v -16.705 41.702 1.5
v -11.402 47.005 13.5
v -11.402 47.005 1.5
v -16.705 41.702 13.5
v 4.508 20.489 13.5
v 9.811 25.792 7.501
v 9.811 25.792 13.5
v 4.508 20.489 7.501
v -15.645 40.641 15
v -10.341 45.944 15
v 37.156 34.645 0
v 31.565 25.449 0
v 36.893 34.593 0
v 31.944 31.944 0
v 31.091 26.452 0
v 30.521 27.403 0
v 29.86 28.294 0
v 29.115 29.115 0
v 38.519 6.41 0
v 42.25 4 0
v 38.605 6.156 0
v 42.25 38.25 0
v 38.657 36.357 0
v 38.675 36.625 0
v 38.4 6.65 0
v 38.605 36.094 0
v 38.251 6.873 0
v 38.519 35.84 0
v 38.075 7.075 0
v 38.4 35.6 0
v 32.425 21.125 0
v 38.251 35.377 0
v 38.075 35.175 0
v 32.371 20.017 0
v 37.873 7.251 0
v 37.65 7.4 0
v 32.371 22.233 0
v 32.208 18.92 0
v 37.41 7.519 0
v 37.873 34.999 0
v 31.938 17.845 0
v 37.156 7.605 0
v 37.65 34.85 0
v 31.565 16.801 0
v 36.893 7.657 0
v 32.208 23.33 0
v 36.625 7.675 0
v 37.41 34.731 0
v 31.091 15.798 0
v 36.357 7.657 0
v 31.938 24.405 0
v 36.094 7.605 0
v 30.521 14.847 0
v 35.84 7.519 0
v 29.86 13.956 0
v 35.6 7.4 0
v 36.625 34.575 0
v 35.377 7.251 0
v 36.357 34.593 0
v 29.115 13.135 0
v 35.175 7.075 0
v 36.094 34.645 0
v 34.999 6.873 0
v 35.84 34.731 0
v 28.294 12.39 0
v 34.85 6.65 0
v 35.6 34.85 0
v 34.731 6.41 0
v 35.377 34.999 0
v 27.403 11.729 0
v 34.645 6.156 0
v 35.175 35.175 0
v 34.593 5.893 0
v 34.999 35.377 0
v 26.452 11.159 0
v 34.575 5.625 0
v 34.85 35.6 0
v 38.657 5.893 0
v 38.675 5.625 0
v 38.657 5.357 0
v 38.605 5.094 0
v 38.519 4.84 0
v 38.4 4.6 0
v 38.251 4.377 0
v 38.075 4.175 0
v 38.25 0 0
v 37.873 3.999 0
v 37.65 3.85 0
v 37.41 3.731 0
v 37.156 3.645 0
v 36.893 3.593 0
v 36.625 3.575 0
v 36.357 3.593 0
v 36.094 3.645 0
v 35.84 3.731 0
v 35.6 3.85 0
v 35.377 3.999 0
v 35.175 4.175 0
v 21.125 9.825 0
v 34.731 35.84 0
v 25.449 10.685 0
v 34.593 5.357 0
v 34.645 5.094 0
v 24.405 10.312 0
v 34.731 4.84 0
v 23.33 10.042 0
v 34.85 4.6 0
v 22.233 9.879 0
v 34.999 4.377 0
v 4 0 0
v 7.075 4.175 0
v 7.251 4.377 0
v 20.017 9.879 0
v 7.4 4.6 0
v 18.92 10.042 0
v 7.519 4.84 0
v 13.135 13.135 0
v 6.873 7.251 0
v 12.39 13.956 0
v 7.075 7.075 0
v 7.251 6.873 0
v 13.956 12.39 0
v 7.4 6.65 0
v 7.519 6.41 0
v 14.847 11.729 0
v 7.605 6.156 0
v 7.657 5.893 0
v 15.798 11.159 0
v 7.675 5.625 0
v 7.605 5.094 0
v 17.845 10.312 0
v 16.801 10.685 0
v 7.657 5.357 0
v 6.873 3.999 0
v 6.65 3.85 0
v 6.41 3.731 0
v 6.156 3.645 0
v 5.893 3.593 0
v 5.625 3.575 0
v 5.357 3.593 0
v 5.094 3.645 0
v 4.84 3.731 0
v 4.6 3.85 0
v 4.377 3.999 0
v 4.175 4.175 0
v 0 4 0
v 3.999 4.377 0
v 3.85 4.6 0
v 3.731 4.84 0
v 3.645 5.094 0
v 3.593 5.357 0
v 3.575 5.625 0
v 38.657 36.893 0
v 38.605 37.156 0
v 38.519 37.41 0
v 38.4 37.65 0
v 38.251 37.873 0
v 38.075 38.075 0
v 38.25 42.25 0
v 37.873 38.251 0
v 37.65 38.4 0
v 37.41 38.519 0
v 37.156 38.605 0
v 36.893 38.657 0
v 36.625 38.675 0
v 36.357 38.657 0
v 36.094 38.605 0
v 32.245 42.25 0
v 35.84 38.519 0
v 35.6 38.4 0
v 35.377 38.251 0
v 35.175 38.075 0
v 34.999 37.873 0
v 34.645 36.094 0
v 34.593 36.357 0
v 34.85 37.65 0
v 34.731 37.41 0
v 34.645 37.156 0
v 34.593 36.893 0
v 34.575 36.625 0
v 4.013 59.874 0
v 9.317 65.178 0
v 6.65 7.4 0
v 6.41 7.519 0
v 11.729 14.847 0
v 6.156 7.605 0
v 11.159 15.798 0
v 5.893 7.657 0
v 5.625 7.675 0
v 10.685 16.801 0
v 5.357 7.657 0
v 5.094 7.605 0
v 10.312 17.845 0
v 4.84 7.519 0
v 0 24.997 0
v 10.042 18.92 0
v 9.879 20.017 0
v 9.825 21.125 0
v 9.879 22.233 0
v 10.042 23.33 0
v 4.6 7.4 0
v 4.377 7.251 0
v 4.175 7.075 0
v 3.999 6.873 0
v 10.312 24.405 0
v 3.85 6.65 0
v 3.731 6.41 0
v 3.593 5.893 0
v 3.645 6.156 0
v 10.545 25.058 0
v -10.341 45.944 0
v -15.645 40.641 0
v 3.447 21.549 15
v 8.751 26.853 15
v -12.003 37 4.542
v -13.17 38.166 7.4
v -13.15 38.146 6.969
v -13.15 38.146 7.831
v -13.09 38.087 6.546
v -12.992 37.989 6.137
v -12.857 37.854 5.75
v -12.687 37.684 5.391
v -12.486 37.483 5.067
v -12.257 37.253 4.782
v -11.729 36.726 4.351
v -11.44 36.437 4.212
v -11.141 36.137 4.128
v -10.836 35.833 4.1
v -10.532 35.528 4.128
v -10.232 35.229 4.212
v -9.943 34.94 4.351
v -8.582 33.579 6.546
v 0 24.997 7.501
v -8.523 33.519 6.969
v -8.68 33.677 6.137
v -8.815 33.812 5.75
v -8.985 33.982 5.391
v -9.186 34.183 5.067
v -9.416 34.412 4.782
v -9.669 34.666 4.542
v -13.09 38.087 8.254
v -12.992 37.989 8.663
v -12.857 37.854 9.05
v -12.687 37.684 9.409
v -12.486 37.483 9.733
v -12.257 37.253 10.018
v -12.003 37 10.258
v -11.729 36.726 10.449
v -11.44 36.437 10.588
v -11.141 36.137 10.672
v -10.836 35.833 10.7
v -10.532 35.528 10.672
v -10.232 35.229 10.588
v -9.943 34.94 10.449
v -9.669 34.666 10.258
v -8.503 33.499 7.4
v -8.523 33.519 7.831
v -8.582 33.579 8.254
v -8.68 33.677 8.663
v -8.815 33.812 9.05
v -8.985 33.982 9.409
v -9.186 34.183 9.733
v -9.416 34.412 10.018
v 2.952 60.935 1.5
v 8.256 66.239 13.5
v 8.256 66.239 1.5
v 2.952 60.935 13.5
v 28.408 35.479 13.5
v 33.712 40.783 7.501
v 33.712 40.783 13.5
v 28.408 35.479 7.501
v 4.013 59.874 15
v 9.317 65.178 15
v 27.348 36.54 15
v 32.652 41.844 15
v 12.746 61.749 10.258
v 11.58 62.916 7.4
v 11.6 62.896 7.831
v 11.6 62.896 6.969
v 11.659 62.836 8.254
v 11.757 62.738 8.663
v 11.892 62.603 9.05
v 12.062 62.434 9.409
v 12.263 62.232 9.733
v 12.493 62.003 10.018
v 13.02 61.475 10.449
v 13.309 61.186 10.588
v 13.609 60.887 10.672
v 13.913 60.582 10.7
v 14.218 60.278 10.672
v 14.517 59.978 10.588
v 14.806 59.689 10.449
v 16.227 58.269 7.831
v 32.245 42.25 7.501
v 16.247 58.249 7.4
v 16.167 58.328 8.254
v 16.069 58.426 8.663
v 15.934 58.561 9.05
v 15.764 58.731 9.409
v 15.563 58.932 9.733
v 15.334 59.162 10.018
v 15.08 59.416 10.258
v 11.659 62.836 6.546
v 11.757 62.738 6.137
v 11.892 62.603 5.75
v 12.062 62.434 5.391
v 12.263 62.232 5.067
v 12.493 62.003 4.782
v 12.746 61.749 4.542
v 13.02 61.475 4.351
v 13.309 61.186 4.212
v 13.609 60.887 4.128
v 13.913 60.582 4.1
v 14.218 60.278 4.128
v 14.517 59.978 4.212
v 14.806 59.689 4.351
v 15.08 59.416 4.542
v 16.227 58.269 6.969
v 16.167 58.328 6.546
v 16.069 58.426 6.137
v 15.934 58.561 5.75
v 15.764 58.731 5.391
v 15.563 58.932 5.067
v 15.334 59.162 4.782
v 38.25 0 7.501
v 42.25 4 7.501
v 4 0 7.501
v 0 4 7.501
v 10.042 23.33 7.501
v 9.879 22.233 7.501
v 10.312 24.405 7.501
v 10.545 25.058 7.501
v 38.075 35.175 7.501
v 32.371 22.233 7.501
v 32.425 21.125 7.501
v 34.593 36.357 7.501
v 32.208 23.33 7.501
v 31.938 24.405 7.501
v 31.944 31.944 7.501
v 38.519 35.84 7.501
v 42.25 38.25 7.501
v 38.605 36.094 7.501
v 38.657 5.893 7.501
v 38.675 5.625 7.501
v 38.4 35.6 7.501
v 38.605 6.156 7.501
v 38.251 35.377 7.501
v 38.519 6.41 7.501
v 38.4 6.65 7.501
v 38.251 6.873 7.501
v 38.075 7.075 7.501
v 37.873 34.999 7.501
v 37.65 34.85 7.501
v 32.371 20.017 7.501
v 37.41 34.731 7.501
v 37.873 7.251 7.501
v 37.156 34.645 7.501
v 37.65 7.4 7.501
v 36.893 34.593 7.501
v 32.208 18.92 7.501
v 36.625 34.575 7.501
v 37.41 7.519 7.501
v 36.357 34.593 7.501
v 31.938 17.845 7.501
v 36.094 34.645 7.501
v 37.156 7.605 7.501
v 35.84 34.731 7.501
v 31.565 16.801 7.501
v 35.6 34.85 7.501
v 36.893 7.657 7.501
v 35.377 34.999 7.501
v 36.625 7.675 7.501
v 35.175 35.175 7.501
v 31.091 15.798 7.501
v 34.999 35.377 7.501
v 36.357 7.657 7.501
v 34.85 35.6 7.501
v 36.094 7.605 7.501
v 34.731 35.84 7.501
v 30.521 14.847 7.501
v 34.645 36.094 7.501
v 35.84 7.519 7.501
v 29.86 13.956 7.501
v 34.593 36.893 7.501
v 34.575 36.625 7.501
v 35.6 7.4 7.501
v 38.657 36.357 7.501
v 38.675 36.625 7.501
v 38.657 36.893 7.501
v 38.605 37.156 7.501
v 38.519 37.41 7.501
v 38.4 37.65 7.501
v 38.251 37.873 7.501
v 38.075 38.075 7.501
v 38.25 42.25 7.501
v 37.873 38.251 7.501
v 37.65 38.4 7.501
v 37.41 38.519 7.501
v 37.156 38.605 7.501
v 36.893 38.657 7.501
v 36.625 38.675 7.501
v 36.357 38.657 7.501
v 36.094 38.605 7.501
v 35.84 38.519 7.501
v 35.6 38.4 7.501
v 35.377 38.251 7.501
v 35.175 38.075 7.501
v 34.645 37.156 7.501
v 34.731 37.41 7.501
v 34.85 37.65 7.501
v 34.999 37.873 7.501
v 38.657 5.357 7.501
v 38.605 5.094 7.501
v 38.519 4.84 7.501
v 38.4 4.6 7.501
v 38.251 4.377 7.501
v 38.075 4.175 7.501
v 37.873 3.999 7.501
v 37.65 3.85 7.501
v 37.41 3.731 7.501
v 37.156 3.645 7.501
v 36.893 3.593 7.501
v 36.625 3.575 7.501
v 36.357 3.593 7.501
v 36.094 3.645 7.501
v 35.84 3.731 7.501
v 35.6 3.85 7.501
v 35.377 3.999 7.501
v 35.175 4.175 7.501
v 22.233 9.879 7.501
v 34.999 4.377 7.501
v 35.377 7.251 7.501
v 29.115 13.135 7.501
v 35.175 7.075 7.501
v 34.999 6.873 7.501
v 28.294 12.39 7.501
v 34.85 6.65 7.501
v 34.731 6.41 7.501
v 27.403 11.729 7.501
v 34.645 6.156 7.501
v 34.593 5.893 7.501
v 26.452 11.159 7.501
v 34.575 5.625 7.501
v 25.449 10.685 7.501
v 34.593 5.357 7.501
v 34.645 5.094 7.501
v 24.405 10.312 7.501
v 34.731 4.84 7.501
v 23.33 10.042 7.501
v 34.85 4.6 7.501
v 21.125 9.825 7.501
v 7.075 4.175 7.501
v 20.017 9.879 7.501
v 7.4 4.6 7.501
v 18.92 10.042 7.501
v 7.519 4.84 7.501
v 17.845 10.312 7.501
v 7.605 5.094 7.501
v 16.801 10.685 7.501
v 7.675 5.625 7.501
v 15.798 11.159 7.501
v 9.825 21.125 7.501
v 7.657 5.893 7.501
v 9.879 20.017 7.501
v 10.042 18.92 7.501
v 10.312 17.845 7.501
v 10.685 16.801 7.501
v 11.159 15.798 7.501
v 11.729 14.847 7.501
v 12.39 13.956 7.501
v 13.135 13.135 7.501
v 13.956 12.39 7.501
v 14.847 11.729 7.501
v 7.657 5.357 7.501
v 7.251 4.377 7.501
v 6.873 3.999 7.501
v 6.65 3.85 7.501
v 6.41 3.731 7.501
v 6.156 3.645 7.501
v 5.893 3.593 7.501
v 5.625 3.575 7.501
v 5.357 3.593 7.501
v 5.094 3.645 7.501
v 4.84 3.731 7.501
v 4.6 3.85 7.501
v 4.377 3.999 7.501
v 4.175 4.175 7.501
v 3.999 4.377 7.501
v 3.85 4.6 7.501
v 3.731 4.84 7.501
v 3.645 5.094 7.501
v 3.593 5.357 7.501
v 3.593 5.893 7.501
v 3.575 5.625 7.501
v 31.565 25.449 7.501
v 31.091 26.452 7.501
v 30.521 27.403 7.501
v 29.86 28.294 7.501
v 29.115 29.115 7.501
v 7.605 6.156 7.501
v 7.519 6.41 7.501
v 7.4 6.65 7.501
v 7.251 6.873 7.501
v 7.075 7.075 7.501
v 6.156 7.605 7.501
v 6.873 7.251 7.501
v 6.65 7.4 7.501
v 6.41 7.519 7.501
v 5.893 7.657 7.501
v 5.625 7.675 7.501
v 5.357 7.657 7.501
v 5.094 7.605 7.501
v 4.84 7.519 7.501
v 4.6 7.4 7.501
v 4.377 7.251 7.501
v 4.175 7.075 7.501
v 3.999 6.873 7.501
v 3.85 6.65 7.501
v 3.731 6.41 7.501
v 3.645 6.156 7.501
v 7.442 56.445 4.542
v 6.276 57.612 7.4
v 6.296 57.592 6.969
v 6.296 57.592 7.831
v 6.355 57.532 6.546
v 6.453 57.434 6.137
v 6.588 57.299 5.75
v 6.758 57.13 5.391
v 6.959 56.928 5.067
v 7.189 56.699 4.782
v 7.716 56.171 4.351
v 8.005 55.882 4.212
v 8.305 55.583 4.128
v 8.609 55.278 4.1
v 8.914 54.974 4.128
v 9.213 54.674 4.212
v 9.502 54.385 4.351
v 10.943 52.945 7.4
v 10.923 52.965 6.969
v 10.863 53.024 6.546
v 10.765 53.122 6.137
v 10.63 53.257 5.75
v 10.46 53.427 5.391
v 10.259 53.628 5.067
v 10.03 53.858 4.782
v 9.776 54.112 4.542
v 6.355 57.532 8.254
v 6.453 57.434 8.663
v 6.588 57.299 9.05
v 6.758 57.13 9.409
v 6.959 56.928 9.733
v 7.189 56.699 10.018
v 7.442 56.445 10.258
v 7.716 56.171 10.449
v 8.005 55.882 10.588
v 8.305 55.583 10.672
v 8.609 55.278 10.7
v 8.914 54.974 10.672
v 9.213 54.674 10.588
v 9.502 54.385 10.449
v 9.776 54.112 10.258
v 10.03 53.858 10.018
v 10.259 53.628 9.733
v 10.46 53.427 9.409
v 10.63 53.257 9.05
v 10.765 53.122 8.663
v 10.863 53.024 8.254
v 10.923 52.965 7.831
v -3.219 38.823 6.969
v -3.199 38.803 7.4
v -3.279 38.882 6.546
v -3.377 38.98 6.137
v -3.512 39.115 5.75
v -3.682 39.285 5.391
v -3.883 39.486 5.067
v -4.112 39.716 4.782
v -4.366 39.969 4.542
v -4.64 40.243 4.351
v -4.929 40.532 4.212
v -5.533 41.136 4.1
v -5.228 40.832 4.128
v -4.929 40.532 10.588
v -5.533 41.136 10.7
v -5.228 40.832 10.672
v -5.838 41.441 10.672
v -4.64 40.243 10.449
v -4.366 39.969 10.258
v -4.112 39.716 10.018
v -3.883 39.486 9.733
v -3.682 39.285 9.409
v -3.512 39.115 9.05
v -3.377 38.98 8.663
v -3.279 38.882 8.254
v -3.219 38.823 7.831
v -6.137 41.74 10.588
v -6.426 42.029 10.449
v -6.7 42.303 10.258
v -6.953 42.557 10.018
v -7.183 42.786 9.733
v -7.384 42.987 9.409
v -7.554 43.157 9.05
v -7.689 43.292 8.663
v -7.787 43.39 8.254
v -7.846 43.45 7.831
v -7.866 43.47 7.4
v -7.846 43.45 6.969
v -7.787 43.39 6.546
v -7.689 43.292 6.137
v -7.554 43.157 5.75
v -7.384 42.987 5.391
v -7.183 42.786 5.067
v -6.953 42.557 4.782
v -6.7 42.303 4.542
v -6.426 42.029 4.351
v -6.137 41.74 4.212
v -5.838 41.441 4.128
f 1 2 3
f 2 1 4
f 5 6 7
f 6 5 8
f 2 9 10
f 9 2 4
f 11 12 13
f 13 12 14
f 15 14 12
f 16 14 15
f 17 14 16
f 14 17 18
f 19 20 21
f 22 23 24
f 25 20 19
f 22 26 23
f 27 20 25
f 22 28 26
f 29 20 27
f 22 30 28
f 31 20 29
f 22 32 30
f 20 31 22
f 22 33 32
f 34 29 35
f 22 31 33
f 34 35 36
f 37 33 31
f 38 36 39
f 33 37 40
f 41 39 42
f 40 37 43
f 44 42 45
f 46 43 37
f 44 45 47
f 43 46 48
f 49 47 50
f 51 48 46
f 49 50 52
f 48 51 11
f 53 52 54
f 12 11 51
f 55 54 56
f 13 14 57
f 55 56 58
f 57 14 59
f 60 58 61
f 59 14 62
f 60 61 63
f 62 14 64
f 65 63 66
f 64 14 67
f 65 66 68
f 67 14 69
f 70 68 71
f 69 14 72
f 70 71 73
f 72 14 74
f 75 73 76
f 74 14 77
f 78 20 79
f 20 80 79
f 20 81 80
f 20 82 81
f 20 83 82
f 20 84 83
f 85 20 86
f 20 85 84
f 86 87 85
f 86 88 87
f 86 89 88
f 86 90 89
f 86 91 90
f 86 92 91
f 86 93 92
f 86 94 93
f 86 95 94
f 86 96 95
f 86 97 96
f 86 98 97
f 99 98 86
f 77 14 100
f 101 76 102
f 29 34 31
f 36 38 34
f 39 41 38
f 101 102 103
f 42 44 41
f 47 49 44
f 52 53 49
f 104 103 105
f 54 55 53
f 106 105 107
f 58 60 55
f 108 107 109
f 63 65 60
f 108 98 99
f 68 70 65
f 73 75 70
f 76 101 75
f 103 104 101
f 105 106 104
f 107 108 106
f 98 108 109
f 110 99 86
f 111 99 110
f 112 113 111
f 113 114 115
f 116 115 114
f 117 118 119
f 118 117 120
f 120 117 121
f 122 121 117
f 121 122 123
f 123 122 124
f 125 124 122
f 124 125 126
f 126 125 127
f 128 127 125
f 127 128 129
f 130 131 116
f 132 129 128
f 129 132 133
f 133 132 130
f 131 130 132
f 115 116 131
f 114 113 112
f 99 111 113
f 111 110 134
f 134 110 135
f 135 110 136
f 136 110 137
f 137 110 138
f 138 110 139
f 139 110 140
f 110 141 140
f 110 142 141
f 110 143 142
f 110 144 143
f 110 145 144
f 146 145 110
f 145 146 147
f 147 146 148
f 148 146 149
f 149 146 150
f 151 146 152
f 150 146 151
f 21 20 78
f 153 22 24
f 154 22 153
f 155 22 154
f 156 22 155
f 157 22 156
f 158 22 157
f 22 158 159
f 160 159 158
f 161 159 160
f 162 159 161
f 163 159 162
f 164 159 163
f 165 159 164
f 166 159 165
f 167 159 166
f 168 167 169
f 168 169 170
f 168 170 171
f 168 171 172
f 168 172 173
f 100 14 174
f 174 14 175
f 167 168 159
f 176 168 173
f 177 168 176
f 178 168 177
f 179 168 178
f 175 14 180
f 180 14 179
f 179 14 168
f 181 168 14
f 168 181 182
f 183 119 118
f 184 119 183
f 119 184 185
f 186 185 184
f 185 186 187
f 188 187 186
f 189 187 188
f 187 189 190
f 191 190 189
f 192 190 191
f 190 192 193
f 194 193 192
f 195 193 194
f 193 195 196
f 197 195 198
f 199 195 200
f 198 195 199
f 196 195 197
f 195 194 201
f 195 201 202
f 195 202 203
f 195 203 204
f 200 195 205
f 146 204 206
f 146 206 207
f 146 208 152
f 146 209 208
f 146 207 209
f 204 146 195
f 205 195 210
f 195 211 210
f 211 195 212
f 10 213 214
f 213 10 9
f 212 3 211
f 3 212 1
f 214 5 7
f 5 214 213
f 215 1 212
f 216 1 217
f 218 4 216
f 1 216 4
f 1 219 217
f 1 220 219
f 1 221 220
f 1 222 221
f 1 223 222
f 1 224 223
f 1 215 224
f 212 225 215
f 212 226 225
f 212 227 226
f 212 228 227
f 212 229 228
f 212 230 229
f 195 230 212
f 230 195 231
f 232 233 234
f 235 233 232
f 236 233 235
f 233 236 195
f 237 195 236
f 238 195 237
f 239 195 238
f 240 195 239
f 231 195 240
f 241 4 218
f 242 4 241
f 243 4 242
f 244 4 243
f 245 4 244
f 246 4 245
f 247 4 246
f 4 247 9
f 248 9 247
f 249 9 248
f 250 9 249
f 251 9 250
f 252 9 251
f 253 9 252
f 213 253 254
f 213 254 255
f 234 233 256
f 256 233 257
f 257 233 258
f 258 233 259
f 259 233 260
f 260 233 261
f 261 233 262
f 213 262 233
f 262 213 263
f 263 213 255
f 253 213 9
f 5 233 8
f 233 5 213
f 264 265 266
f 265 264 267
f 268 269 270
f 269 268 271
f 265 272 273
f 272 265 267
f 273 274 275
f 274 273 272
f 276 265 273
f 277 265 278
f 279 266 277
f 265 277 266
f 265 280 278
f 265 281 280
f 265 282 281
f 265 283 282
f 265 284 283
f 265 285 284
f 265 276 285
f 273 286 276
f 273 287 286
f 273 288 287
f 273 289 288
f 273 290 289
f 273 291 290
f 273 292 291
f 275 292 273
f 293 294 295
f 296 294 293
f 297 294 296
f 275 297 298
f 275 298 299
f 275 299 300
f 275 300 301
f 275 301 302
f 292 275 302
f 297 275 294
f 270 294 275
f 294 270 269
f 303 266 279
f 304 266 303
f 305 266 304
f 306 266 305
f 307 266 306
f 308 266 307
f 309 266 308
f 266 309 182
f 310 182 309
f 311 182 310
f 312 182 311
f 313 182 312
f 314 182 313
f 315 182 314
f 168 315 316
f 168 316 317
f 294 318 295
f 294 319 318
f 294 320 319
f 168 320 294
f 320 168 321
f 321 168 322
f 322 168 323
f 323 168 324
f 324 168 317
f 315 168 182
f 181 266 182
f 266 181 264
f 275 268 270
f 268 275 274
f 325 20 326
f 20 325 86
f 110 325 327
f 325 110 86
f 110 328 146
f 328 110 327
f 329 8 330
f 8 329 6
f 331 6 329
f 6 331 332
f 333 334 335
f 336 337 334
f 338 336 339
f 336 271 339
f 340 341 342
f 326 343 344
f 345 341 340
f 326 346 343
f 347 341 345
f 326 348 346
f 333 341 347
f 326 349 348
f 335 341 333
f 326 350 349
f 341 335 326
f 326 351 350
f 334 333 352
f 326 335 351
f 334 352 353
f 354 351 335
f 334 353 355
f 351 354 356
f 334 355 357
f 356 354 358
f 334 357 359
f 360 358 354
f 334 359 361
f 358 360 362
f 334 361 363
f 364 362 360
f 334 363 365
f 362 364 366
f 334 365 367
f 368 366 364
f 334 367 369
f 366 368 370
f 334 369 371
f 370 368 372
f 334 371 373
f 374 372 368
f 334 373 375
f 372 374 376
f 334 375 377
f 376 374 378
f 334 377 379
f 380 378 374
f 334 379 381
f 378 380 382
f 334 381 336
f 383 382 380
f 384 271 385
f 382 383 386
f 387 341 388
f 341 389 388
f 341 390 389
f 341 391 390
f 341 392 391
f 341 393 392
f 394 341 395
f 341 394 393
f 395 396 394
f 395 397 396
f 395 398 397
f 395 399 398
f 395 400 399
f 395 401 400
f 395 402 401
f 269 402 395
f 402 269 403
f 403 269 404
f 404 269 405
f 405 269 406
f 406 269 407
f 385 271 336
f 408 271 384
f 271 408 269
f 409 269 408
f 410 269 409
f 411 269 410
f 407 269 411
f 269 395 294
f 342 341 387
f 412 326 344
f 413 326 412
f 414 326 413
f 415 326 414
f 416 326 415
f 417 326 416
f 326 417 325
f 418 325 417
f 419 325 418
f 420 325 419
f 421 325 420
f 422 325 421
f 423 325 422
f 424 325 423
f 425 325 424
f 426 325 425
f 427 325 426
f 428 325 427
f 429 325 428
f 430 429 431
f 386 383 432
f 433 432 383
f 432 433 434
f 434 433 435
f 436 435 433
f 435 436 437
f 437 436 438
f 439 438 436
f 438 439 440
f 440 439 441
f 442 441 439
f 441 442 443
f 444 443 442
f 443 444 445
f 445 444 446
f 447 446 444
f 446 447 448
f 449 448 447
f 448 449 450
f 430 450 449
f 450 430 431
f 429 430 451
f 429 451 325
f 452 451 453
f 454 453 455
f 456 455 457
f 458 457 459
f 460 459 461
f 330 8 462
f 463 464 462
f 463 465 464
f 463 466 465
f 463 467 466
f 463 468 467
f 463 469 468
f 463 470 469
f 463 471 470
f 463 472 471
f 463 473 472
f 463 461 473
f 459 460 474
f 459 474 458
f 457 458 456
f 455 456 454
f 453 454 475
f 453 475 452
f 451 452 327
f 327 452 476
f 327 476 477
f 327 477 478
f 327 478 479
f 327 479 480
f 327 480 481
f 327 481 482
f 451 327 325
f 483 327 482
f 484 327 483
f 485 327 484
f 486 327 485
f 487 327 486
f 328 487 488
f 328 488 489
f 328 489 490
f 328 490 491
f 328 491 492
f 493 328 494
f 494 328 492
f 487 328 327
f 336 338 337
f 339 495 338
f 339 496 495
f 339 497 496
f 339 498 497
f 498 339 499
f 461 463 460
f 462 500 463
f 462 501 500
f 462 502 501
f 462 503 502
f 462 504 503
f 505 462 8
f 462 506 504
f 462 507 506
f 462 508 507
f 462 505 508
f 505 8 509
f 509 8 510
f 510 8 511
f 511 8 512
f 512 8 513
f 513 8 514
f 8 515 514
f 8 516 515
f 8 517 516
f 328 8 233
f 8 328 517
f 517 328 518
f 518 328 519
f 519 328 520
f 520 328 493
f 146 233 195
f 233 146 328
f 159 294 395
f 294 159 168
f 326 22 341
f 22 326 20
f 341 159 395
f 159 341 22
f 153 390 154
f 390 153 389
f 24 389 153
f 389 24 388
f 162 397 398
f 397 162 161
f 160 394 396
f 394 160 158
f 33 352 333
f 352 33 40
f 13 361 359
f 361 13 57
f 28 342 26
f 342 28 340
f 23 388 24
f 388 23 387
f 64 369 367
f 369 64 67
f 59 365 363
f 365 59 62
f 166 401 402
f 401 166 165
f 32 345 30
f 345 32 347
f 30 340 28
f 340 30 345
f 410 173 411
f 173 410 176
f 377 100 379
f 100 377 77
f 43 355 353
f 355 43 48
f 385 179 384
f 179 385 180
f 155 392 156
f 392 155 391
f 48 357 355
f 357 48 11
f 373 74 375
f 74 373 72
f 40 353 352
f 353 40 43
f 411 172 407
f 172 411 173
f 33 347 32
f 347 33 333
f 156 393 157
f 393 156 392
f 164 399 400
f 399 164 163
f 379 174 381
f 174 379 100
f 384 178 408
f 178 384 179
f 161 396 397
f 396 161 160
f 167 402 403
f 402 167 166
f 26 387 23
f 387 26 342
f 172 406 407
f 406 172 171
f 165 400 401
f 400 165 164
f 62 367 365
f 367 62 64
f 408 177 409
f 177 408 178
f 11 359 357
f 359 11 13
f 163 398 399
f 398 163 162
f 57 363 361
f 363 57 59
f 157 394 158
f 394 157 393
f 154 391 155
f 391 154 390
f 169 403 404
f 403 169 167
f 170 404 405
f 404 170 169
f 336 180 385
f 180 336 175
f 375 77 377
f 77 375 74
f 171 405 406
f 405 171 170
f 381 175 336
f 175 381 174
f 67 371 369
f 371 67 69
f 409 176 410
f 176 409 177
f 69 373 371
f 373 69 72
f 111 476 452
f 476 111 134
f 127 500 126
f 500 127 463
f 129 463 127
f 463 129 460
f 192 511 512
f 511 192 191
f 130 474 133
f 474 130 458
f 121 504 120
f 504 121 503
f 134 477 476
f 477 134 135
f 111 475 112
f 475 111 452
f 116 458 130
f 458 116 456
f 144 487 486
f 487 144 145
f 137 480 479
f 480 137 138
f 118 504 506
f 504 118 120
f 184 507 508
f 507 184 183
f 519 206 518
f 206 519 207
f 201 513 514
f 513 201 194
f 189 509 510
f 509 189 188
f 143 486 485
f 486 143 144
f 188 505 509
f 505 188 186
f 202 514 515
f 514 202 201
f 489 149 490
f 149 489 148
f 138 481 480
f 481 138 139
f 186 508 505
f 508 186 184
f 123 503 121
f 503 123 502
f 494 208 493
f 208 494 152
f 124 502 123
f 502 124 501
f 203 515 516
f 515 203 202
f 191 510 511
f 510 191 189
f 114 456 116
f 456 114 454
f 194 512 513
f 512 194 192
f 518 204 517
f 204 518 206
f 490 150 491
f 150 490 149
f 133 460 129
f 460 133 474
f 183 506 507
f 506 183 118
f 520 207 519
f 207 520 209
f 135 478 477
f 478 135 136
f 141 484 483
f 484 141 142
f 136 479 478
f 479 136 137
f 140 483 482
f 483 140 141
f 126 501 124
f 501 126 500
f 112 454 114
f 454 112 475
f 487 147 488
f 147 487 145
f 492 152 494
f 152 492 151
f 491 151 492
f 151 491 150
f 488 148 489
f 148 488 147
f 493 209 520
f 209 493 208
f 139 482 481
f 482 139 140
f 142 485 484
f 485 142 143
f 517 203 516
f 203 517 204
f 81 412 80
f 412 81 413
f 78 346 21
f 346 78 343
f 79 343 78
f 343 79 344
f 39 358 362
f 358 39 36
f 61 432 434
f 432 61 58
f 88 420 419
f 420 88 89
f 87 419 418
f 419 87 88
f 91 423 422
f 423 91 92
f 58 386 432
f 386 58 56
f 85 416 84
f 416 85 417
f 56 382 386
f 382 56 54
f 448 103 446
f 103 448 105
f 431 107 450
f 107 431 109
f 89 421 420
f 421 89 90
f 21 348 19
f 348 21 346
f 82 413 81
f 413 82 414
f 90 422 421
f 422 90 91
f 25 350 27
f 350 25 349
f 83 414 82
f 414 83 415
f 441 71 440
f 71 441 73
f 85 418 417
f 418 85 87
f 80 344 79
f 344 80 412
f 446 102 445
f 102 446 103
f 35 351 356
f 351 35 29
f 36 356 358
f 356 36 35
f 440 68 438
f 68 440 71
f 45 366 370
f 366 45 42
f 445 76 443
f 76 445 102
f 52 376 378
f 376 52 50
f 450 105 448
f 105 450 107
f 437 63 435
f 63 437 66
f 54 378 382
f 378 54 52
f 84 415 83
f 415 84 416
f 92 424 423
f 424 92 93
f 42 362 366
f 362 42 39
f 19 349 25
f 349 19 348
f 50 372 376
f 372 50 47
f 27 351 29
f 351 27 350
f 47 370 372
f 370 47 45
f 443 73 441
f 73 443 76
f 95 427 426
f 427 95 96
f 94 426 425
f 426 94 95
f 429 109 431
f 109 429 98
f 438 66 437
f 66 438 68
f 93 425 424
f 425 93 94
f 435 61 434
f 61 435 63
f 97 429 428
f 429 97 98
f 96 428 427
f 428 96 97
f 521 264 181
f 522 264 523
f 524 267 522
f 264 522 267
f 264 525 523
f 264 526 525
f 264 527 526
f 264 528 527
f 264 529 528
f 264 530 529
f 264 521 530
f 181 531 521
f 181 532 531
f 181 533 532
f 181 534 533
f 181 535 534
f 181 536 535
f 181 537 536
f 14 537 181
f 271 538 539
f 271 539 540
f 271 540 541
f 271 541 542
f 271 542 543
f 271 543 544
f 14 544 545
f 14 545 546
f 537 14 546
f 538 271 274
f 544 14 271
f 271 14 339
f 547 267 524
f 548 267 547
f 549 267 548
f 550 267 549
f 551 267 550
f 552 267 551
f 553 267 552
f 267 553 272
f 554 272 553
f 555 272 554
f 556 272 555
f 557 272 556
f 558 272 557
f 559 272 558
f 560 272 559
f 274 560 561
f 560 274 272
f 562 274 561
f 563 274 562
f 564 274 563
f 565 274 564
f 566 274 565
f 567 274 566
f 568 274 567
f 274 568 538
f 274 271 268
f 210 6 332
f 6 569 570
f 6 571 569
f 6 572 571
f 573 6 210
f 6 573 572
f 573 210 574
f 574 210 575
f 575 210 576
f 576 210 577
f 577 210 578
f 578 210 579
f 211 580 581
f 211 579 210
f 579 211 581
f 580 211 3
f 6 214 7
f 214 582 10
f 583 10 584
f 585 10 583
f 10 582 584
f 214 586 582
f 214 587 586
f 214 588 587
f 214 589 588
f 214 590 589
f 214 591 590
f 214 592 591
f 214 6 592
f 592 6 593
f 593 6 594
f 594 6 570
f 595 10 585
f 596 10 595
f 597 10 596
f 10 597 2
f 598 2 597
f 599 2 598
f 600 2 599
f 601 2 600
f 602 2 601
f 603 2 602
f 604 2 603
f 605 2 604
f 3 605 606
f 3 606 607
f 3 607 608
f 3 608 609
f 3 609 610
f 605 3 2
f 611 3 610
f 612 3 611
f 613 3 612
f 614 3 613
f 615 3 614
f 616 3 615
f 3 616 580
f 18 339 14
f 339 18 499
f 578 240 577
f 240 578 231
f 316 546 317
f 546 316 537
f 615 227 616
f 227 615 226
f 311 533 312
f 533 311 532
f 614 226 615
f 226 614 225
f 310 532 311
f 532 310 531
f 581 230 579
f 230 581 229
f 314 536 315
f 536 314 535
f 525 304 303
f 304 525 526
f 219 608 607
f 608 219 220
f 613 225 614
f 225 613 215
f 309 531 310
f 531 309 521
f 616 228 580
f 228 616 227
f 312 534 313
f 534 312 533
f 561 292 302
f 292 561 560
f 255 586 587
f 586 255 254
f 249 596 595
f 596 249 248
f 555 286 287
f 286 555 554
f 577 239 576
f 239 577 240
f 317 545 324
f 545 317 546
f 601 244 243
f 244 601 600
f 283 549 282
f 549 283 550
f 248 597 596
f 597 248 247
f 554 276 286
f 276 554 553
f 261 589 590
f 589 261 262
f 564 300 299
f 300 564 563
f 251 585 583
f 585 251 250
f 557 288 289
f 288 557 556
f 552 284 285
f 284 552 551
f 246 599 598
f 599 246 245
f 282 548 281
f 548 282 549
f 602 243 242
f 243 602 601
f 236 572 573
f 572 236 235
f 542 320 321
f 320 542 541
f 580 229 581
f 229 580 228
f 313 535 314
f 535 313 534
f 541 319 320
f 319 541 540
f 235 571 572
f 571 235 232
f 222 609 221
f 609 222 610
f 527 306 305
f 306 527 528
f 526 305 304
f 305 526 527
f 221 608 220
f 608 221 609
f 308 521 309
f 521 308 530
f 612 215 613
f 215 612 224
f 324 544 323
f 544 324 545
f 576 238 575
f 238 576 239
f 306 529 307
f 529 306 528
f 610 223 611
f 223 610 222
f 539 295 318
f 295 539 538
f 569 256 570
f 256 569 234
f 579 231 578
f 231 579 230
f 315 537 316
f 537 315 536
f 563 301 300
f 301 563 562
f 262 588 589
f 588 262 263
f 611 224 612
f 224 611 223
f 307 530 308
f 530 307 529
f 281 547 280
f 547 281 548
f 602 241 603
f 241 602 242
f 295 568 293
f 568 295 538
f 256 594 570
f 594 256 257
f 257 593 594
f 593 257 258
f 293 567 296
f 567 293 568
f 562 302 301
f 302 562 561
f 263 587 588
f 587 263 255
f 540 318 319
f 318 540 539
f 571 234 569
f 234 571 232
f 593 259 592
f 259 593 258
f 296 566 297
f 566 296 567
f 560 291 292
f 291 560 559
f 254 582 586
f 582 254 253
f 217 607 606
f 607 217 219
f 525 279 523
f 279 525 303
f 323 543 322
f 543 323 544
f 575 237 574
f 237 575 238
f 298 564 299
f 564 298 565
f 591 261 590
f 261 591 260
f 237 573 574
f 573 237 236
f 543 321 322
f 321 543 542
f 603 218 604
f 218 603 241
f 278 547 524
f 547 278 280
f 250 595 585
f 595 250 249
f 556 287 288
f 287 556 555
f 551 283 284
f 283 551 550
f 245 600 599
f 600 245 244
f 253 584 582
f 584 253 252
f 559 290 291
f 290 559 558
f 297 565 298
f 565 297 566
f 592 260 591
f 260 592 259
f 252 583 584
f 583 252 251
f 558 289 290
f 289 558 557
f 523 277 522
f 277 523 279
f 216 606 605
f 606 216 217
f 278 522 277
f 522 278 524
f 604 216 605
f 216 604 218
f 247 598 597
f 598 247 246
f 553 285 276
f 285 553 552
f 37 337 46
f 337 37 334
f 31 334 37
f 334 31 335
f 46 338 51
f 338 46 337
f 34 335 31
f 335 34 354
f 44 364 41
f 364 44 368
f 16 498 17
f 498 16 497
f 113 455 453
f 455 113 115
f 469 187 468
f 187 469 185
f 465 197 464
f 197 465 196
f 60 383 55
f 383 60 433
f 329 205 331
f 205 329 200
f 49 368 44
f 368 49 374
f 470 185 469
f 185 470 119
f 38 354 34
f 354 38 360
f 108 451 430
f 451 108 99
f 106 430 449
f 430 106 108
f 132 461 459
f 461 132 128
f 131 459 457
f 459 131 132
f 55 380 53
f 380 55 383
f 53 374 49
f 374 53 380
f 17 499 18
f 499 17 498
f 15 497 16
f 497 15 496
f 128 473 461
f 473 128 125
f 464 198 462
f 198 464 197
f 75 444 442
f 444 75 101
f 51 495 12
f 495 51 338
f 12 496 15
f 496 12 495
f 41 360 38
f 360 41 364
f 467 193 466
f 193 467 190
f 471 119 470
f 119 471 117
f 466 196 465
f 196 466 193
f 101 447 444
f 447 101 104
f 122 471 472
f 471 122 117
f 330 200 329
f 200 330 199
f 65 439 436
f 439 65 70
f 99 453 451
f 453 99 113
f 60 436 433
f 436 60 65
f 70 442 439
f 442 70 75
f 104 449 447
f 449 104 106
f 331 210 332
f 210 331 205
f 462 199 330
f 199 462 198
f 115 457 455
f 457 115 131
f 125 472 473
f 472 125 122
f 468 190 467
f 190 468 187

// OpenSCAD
// file: scad/tapercube.scad
module tapercube(width=10, height=10, depth=10, taper=3.0) {
  plane = 0.001;
  hull() {
    translate([taper/2,taper/2,0])
      cube([width-taper, height-taper, plane]);
    translate([0,0,taper/2]) {
      translate([0,taper/2])
        cube([width, height-taper, plane]);
      translate([taper/2,0])
        cube([width-taper, height, plane]);
    }

    translate([taper/2,taper/2,depth-plane])
      cube([width-taper, height-taper, plane]);
    translate([0,0,depth-taper/2]) {
      translate([0,taper/2])
        cube([width, height-taper, plane]);
      translate([taper/2,0])
        cube([width-taper, height, plane]);
    }
  }
}

module cornerless_cube(width=10, height=10, depth=10, taper=3.0) {
  plane = 0.001;
  hull() {
    translate([0,taper/2])
      cube([width, height-taper, plane]);
    translate([taper/2,0])
      cube([width-taper, height, plane]);

    translate([0,0,depth]) {
      translate([0,taper/2])
        cube([width, height-taper, plane]);
      translate([taper/2,0])
        cube([width-taper, height, plane]);
    }
  }
}
// main file
include <scad/tapercube.scad>;

long=100;
shim=0.1;
fudge = 0.3;

motor_width = 42.25;
motor_mount_ring_r = 11.0 + fudge;
motor_mount_hole_r = 1.75 + fudge;
motor_mount_height = 7.5;
motor_mount_opening = 20;
motor_mount_opening_offset = 5.0+fudge;
motor_dist_between_mount_holes = 31;

leg_bolt_r = 3.0+fudge;
leg_extra = 30.0;
leg_height = 15.0;

module motor_mount_holes() {
  d = motor_dist_between_mount_holes;
  r = sqrt(d*d*2)/2;
  for (theta=[45,135,225,315])
    translate([cos(theta)*r, sin(theta)*r])
      cylinder(r=motor_mount_hole_r, h=long, center=true, $fn = 48);
}

module motor_mount() {
  difference() {
    union() {
      cornerless_cube(motor_width, motor_width, motor_mount_height, 8.0);
  
      translate([motor_width/2, motor_width/2]) {
        rotate([0, 0, 45]) {
          translate([-motor_mount_opening/2+motor_mount_opening_offset-motor_mount_height, motor_mount_ring_r, leg_height])
            rotate([0, 90, 0])
              cornerless_cube(leg_height, leg_extra, motor_mount_height, 3.0);

          translate([motor_mount_opening/2+motor_mount_opening_offset, 5, leg_height])
            rotate([0, 90, 0])
              cornerless_cube(leg_height, leg_extra+6, motor_mount_height, 3.0);
        }
      }
            // %cube([leg_height, leg_extra, motor_mount_height]);
      // rotate([0, 0, 90])
      //   translate([-motor_width/2, -motor_width/4])
      //     %cornerless_cube(motor_width, motor_width/2, motor_mount_height, 8.0);
    }
    
    translate([motor_width/2, motor_width/2]) {
      motor_mount_holes();

      // U-shaped opening in center of motor mount
      translate([0, 0, -shim])
        // Center
        cylinder(r=motor_mount_ring_r, h=long, $fn = 64);
        // U Legs
        rotate([0, 0, 45])
          translate([-motor_mount_opening/2+motor_mount_opening_offset, 0, -shim]) {
            cube([motor_mount_opening, long, long]);
            translate([-motor_mount_height, motor_mount_ring_r, leg_height])
              rotate([0, 90, 0])
                translate([leg_height/2, leg_extra-leg_bolt_r-5, -long/2])
                  cylinder(r=leg_bolt_r, h=long, $fn=48);
          }
    }
  }  
}

motor_mount();
